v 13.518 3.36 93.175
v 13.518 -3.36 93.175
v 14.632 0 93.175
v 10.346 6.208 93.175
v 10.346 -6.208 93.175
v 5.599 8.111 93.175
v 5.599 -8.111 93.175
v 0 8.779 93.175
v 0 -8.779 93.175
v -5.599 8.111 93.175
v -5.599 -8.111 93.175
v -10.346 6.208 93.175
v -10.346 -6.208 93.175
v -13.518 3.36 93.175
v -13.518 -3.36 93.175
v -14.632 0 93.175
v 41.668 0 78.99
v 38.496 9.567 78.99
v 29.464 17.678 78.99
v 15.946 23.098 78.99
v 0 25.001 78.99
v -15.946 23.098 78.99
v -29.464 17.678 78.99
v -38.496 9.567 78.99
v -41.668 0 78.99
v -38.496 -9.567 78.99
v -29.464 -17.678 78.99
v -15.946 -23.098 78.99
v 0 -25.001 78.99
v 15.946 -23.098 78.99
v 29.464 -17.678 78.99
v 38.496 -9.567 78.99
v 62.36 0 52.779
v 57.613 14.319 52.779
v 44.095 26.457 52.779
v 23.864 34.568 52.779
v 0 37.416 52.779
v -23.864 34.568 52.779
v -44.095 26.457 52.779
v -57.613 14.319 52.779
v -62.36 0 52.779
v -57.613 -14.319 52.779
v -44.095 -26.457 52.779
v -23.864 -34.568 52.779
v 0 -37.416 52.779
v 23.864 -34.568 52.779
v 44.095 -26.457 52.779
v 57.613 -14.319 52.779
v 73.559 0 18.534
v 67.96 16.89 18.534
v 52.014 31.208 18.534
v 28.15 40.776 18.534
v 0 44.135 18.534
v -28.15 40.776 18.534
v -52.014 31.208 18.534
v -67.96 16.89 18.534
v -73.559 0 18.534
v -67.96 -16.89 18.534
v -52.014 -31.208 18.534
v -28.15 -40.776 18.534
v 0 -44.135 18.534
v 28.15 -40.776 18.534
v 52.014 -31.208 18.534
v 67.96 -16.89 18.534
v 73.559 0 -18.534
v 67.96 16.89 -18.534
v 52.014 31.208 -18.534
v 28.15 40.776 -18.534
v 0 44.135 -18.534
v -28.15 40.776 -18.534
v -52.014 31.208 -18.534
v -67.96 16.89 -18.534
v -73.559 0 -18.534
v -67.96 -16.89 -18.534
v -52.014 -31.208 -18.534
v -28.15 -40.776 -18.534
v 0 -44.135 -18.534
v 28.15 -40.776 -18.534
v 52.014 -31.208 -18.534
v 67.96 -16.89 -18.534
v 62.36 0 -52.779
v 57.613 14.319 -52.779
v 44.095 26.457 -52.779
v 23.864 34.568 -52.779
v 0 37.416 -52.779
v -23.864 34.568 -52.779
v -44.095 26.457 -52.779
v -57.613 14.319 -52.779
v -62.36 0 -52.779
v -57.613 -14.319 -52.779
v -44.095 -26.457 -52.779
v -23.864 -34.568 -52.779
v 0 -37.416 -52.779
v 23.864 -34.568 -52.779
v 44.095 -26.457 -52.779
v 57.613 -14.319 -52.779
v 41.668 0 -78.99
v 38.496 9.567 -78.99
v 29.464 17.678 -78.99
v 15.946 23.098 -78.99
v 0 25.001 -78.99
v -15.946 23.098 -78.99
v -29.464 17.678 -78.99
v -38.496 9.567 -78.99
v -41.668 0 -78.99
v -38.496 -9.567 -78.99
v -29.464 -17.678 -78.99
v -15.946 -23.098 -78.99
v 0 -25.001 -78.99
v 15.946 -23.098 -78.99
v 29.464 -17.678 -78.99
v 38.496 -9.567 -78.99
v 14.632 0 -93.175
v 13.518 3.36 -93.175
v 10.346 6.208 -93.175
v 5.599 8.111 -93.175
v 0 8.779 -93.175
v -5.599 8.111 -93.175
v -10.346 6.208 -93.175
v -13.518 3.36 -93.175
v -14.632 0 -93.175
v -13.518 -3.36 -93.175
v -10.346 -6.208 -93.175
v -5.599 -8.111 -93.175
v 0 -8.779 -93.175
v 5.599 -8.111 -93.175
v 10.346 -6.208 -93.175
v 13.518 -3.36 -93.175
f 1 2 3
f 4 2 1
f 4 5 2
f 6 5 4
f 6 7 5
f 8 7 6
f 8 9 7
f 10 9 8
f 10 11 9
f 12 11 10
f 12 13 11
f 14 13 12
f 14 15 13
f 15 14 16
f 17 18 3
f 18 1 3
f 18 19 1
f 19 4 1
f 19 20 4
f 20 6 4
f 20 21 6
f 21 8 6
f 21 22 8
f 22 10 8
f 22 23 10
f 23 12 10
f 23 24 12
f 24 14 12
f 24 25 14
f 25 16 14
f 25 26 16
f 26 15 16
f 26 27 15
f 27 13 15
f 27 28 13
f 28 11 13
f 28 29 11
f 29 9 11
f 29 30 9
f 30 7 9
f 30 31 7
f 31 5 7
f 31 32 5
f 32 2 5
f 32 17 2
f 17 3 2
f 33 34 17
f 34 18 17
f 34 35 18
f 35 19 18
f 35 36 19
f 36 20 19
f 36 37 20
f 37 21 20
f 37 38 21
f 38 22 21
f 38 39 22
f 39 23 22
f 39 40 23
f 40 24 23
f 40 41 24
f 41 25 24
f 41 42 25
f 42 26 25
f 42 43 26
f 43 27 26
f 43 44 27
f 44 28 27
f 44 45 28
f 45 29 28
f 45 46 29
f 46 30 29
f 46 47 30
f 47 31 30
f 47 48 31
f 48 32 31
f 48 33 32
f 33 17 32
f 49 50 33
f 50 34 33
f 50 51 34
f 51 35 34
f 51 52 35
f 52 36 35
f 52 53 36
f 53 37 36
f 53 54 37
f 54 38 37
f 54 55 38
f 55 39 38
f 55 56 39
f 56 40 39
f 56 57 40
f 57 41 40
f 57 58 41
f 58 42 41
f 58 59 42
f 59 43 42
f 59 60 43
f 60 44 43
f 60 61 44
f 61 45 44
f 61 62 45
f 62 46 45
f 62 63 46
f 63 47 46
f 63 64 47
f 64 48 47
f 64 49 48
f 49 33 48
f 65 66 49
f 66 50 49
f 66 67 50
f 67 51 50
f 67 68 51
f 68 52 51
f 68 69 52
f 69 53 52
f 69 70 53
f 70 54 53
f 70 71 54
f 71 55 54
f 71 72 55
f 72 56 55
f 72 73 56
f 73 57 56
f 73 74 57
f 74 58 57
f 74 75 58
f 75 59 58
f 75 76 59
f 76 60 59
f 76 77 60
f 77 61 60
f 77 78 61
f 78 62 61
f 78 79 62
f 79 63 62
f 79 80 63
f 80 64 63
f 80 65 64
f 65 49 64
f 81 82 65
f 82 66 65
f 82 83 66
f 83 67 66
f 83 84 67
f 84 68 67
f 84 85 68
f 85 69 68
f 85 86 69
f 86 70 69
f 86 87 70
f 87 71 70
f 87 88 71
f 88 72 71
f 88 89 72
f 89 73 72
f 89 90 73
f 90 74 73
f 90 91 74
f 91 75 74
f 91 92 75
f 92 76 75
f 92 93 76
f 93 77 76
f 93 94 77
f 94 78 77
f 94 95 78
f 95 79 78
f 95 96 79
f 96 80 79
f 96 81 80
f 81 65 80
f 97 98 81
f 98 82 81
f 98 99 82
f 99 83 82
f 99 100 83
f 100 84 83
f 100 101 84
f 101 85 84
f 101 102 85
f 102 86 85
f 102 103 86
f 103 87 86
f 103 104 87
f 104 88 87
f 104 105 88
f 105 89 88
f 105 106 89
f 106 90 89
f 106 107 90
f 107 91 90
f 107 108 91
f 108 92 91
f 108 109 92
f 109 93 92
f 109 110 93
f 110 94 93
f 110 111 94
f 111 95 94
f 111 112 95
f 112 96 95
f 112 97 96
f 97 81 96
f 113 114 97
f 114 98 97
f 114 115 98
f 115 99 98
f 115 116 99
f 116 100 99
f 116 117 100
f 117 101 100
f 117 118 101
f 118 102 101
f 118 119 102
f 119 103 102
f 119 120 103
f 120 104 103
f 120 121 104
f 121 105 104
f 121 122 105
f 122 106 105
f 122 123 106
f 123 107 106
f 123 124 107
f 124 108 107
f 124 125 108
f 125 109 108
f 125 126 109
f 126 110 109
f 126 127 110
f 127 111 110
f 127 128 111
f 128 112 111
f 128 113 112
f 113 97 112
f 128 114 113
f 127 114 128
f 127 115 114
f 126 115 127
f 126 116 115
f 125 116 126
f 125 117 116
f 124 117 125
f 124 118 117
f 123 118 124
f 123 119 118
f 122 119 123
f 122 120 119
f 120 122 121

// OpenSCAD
// Generated by SolidPython 1.0.1 on 2020-07-29 00:46:52


scale(v = [15, 9, 19]) {
	sphere(r = 5);
}
/***********************************************
*********      SolidPython code:      **********
************************************************
 
# import packages: SolidPython
from solid import *
from solid.utils import *
from itertools import chain, combinations, permutations


class Resize:

    def __init__(self, scad_file):
        self.scad_file = scad_file
        #self.scad_file = import_scad(scad_file)
        # cone/cylinder param:
        self.r1 = 0
        self.r2 = 0
        self.h = 0
        # rectangular prism param:
        self.w = 0
        self.l = 0
        # ellipse param:
        self.r = 0

    # import OpenScad code (file name corresponds to shape)


    # classify shape + parameters
    def assign(self, param1, param2, param3):
        if self.scad_file == 'cone.scad':
            self.r1 = param1
            self.r2 = param2
            self.h = param3
        elif self.scad_file == 'cylinder.scad':
            self.r1 = param1
            self.r2 = param2
            self.h = param3
        elif self.scad_file == 'rectangularPrism.scad':
            self.h = param1
            self.l = param2
            self.w = param3
        else:
            self.r = param1
            self.h = param2

    # resize parameters
    def iterate(self):
        x = range(3, 20, 2)
        i = 1
        if self.scad_file == 'cone.scad':
            tempList = list(permutations(x, 2))
            for temp in tempList:
                param1 = temp[0]
                param2 = temp[1]
                filepath = 'produced_scad_files/' + 'cone' + str(param1) + '_' + str(param2) + '_' + '.scad'
                scad_render_to_file(cylinder(h=param1, r1=param2, r2=0), filepath)

        elif self.scad_file == 'cylinder.scad':
            tempList = list(permutations(x, 3))
            for temp in tempList:
                param1 = temp[0]
                param2 = temp[1]
                filepath = 'produced_scad_files/' + 'cylinder' + str(param1) + '_' + str(param2) + '_' + '.scad'
                scad_render_to_file(cylinder(h=param1, r1=param2, r2=param2), filepath)

        elif self.scad_file == 'rectangularPrism.scad':
            tempList = list(permutations(x, 3))
            for temp in tempList:
                param1 = temp[0]
                param2 = temp[1]
                param3 = temp[2]
                filepath = 'produced_scad_files/' + 'rectangularPrism' + str(param1) + '_' + str(param2) + '_' + str(
                    param3) + '.scad'
                scad_render_to_file(cube(size=(param1, param2, param3)), filepath)

        elif self.scad_file == 'ellipse.scad':
            tempList = list(permutations(x, 4))
            for temp in tempList:
                param1 = temp[0]
                param2 = temp[1]
                param3 = temp[2]
                param4 = temp[3]
                filepath = 'produced_scad_files/' + 'ellipse' + str(param1) + '_' + str(param2) + '_' + str(param3) + '_' + str(param4) + '.scad'
                scad_render_to_file(scale([param1, param2, param3])(sphere(r=param4)), filepath)

    def render_to_scadfile(self):
        scad_render_to_file(scad, 'example.scad') 
 
************************************************/
